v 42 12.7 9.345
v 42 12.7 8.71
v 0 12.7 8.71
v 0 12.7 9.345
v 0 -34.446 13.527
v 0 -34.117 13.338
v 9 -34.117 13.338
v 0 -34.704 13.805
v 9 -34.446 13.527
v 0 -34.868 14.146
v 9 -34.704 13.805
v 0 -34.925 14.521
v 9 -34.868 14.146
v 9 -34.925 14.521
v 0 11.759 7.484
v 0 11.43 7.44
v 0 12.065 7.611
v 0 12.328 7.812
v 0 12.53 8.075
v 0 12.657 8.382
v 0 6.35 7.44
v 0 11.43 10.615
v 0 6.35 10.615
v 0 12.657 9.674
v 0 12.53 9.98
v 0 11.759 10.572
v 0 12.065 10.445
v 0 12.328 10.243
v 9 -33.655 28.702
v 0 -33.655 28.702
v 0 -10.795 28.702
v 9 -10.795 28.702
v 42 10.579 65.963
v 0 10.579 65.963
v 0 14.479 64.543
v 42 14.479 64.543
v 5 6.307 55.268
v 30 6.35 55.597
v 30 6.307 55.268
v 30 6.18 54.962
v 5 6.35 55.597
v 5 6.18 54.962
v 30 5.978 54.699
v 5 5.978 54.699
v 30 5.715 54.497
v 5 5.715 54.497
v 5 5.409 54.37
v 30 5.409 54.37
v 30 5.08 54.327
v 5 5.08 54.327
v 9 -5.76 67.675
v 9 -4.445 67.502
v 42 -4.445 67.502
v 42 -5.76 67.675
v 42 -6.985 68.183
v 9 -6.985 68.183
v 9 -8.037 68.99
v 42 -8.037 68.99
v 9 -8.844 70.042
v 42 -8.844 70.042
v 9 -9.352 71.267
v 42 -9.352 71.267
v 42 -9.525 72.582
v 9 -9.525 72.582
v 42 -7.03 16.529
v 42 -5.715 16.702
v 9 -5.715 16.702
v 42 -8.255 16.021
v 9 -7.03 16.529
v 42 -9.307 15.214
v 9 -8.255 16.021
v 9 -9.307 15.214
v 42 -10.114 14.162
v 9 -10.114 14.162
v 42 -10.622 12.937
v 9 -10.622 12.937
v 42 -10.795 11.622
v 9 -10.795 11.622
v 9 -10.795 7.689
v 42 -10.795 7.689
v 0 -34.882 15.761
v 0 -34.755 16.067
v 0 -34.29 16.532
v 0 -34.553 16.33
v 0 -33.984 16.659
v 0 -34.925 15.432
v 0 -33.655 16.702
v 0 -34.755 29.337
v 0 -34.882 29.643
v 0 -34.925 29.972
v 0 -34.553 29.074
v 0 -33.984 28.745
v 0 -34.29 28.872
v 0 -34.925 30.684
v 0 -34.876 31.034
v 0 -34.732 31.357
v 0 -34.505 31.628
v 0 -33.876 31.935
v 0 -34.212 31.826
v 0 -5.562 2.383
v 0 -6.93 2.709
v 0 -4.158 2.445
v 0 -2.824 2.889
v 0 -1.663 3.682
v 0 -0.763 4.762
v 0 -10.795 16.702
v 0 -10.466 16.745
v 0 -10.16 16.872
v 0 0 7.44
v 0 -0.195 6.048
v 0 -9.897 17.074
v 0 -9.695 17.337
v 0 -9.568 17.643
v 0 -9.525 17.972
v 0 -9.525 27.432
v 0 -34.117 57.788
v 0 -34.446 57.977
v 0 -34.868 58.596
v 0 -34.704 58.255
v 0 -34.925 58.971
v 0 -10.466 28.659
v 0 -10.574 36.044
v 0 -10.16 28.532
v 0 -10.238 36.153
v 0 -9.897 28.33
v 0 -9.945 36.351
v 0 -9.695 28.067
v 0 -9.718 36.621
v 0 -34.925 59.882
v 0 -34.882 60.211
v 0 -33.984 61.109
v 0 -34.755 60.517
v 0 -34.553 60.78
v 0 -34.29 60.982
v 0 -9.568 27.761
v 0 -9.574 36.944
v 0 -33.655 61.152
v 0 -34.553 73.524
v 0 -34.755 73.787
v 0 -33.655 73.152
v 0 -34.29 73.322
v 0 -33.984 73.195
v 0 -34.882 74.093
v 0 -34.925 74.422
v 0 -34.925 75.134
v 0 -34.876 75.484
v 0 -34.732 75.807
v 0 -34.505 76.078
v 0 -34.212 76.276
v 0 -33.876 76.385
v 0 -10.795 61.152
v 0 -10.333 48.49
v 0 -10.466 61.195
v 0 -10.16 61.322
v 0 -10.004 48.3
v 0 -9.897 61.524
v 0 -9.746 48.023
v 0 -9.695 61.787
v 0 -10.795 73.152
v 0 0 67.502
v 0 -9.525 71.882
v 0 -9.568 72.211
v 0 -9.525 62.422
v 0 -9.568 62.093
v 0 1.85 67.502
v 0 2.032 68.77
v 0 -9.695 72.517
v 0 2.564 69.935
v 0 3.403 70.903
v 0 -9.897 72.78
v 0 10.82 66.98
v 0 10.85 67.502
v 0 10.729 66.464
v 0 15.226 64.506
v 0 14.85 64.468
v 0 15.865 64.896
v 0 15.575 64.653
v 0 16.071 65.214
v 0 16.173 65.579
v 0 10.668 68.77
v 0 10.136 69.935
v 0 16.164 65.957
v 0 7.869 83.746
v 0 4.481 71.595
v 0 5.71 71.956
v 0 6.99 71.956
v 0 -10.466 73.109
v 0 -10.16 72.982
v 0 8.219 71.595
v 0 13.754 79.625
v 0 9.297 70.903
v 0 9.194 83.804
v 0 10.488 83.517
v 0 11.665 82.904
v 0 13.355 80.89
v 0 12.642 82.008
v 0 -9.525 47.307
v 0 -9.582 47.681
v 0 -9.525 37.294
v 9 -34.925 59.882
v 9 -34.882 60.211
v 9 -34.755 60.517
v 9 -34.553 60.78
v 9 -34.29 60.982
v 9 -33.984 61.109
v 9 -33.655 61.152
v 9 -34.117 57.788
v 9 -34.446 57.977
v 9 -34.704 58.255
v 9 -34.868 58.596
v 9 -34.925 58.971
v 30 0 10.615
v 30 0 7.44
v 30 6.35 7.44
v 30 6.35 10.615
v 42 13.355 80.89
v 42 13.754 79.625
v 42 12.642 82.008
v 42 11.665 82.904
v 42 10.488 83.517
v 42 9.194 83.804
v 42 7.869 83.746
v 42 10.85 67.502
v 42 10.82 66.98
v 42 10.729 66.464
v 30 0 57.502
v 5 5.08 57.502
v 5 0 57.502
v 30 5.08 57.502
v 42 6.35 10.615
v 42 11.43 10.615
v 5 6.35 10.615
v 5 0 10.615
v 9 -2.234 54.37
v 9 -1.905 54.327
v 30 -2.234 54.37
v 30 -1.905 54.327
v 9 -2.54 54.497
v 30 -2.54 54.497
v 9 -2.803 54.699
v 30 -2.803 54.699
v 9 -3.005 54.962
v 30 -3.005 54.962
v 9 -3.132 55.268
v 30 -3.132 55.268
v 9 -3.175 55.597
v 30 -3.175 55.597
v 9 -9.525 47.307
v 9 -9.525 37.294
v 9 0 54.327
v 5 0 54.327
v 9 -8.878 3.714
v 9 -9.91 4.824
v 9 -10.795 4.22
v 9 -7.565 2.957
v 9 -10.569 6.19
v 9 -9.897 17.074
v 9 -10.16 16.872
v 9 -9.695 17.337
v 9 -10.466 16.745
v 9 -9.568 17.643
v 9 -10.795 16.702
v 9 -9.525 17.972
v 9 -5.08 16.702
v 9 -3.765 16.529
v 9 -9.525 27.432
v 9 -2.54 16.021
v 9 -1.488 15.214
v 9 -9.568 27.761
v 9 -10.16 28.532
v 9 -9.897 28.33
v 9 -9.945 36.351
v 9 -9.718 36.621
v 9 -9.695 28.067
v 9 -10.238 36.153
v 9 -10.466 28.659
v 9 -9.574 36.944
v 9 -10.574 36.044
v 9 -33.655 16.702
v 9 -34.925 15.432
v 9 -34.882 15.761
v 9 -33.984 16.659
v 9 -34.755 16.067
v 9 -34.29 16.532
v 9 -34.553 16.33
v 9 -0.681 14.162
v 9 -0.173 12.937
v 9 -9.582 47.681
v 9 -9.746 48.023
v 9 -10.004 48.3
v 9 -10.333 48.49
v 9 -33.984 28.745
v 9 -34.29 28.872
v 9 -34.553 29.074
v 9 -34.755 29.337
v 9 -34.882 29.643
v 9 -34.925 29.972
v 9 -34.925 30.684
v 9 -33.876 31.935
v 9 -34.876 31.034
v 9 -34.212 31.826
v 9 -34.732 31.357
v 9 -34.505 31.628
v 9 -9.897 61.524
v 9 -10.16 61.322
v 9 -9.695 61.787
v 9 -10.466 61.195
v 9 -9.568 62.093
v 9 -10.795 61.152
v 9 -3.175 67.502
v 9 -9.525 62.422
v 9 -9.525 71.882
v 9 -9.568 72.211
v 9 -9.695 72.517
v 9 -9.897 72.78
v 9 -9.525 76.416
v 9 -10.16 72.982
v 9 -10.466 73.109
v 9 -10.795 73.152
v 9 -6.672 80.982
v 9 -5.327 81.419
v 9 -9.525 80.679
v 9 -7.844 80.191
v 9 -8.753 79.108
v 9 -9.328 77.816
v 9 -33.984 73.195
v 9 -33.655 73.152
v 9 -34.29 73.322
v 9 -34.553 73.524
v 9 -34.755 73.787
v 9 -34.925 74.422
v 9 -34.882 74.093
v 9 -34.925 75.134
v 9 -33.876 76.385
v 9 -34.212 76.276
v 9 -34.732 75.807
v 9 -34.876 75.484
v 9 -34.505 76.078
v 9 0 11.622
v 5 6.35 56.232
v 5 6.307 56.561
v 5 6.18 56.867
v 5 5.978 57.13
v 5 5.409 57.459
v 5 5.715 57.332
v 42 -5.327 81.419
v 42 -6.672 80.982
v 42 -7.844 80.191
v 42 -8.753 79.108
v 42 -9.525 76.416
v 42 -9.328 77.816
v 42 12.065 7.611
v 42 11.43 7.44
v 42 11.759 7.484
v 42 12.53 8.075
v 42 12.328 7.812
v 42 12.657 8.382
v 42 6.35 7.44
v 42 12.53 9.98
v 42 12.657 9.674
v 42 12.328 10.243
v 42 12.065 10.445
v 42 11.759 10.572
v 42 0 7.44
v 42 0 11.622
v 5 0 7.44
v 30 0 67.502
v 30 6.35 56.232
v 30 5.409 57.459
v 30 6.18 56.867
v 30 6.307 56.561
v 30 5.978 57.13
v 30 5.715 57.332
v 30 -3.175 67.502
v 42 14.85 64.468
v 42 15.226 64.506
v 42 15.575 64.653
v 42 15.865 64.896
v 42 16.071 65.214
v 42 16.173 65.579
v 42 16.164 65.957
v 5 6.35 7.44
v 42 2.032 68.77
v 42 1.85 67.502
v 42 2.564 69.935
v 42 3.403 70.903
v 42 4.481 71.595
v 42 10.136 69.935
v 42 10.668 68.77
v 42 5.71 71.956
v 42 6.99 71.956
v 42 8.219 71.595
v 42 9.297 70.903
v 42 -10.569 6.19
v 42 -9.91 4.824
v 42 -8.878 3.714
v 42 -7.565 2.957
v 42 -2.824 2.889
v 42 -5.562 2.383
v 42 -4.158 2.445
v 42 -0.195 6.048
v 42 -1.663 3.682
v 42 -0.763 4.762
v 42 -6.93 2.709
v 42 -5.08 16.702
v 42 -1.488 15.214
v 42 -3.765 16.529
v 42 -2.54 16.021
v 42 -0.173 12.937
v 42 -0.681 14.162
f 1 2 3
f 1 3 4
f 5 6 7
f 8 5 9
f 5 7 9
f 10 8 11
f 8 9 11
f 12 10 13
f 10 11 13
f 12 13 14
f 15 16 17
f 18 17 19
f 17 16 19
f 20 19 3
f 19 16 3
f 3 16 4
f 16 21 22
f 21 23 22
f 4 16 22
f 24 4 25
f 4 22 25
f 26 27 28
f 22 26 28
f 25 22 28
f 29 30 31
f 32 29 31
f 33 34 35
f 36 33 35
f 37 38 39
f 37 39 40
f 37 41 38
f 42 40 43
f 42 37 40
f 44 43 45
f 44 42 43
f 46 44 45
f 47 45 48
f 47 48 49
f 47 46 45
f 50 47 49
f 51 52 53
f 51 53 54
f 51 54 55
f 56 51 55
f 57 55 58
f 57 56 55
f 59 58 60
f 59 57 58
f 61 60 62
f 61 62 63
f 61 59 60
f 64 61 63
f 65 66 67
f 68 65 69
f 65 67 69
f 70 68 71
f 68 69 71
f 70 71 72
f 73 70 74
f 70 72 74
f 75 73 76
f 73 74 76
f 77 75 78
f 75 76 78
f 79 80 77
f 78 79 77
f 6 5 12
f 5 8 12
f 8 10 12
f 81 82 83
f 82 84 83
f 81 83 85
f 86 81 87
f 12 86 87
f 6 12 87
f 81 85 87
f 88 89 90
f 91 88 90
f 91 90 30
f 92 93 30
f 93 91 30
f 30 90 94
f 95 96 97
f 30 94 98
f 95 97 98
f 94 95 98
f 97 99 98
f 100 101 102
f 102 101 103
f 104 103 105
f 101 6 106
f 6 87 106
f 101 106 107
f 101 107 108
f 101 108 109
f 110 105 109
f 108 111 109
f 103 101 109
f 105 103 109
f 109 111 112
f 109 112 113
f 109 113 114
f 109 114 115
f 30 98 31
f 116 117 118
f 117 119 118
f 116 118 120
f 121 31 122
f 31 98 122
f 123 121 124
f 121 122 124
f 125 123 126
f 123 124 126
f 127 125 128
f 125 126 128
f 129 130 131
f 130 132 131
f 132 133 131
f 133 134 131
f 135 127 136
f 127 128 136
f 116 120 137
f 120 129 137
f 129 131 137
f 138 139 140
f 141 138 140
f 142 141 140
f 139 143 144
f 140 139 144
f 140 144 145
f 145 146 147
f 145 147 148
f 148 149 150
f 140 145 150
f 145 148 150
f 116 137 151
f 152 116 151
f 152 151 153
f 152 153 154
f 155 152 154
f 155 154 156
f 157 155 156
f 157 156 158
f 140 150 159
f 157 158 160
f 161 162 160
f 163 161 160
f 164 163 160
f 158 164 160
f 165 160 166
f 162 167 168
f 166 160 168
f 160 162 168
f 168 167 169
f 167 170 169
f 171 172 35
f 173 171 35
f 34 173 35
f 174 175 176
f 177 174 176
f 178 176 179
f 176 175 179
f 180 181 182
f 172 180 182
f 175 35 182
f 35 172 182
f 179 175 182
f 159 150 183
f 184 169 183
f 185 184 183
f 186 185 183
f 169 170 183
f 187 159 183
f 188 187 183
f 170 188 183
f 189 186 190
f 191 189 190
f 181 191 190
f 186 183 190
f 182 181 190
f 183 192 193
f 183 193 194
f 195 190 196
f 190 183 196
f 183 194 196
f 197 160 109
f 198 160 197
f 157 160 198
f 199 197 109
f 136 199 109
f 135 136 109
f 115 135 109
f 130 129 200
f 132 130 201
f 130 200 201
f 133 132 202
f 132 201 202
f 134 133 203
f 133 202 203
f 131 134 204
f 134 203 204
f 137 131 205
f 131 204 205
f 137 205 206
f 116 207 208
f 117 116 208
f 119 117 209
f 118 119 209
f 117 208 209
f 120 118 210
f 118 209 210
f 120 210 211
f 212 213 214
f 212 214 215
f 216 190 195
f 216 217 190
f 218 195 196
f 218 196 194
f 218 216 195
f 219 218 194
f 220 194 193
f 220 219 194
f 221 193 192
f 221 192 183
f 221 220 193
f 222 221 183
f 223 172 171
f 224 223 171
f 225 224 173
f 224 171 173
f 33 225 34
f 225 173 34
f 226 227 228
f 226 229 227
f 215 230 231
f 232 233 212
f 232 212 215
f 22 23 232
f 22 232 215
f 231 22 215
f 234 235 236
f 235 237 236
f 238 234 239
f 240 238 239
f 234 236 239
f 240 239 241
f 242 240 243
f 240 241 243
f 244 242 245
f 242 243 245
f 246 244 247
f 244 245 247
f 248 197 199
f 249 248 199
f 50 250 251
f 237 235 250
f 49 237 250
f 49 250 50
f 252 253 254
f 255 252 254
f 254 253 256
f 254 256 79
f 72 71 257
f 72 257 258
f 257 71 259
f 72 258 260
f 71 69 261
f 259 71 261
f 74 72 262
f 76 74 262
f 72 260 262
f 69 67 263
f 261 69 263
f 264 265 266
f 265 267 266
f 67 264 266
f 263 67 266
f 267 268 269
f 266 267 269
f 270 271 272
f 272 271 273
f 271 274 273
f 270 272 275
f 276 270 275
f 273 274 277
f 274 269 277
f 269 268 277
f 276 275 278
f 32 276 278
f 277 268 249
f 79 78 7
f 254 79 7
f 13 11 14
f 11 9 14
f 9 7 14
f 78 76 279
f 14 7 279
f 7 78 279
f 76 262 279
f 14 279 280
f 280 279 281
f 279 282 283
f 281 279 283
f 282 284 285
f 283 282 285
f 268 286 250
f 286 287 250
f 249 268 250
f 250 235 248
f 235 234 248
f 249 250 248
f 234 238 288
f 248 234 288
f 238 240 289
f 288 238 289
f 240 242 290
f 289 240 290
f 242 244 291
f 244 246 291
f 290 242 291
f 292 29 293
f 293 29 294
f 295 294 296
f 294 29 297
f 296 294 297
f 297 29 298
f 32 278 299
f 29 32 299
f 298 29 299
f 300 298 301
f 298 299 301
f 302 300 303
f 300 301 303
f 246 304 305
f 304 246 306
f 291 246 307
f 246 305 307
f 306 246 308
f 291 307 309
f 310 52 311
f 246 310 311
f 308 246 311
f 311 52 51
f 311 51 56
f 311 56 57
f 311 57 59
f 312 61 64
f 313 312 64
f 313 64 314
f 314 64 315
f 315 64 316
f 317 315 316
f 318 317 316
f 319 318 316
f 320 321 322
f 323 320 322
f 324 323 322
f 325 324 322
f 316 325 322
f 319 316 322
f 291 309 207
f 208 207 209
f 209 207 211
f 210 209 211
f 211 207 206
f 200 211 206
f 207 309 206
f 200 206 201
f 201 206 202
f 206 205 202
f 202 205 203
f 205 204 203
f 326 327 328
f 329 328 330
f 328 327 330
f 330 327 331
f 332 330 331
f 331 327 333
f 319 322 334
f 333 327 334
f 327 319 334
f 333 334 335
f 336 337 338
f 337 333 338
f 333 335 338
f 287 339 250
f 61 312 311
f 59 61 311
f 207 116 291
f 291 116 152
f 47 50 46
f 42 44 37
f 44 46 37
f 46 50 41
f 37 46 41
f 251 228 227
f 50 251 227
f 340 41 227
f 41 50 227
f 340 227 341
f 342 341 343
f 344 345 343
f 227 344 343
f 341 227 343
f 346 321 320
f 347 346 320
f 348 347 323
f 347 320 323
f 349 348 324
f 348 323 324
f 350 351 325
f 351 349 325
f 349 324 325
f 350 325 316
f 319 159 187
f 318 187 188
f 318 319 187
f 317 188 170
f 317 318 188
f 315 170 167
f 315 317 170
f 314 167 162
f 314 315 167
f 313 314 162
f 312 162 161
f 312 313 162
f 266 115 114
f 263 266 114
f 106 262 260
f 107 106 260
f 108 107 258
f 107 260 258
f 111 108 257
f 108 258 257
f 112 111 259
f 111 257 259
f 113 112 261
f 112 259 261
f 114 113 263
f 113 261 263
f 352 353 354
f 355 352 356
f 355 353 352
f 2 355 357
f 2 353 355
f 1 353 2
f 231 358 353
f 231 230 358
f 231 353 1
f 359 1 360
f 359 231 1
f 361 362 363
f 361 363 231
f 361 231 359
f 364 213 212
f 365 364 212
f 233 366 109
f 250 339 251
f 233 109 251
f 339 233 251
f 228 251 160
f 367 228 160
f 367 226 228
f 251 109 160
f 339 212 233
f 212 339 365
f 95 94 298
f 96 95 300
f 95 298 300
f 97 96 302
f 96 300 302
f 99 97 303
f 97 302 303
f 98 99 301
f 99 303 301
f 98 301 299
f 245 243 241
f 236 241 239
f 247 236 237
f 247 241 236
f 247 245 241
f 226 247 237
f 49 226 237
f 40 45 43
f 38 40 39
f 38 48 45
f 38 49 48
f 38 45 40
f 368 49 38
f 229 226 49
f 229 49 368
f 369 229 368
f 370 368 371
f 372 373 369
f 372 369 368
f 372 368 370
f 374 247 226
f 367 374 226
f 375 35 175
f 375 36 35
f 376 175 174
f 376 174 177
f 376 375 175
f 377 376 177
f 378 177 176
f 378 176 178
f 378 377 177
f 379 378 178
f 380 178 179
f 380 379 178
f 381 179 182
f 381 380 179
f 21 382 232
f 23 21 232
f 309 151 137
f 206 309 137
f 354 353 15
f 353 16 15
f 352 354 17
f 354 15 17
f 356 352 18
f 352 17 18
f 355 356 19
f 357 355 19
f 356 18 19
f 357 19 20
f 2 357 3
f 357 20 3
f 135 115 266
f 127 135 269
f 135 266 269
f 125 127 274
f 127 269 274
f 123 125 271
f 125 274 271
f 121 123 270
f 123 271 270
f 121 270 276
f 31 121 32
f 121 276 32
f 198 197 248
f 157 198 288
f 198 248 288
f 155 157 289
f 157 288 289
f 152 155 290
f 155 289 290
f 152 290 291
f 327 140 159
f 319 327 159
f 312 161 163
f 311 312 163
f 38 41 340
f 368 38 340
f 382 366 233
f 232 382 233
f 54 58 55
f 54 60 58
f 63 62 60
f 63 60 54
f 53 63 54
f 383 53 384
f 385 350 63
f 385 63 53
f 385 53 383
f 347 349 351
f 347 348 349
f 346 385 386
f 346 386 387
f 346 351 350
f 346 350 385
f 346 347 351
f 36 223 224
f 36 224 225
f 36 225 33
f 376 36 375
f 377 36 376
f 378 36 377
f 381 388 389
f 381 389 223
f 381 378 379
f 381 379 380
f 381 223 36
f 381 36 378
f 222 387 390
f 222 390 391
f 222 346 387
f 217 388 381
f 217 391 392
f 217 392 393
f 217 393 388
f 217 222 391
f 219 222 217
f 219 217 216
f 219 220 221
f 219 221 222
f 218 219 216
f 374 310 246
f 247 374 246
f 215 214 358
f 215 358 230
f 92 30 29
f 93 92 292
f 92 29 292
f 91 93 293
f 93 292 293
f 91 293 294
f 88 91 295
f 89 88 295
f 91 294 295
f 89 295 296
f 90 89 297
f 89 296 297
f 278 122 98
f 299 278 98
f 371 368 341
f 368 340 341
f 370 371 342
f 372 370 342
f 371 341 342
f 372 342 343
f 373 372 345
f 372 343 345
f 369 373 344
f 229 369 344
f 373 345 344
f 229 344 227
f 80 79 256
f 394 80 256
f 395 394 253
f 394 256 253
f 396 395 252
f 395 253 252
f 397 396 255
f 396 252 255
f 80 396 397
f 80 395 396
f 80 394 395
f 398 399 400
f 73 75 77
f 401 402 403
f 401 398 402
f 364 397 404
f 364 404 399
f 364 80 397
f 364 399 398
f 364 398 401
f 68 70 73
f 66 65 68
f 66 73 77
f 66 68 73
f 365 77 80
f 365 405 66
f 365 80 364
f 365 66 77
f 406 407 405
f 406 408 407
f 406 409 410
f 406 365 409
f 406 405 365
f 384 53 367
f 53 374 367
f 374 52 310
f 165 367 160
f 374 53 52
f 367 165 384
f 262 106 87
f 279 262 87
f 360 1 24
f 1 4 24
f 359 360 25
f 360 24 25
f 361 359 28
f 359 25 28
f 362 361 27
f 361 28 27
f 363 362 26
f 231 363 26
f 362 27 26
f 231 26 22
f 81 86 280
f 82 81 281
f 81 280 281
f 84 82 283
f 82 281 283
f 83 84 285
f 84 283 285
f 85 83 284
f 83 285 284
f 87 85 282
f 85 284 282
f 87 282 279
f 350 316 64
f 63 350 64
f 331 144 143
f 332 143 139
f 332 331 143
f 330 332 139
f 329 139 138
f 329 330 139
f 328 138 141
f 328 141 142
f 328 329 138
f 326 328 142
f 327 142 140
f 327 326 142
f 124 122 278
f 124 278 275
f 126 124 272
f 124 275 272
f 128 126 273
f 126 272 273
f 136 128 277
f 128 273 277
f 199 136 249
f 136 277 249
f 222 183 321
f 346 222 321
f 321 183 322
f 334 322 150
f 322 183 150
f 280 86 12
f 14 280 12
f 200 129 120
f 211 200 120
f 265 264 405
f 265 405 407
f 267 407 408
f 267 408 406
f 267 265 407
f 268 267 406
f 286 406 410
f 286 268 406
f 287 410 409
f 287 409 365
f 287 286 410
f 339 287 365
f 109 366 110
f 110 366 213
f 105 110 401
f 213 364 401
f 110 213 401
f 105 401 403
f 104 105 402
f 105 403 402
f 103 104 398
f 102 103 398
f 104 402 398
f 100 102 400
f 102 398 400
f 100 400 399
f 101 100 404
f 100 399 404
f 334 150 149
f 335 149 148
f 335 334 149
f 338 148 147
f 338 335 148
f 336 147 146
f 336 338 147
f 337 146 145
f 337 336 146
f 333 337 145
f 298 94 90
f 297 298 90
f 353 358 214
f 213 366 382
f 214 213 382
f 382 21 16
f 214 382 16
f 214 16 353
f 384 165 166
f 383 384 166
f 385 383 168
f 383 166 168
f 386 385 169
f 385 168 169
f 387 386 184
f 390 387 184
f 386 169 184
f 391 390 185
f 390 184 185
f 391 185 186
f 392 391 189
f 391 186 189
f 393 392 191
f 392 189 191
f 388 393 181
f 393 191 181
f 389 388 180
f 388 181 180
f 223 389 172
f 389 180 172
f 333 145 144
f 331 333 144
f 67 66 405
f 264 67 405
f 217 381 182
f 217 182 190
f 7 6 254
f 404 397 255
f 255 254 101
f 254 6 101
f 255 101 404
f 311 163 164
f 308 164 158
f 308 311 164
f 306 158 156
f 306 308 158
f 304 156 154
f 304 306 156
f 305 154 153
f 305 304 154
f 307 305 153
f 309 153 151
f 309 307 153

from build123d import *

# Parameters (mm, degrees)
F1_DEPTH       = 42
F2_R           = 5.08
F3_R           = 1.27
F4_W           = 25
F4_H           = 3.175
F5_DEPTH       = 12.7
F7_DEPTH       = 33
F8_T1_DEPTH    = 45.7
F8_T3_DEPTH    = 43.656565316
F8_T5_DEPTH    = 41.6709689227
F9_W           = 6.35
F9_H           = 3.175
F10_DEPTH      = 12
F10_DEPTH_BACK = 30
F12_DEPTH      = 21
F12_DEPTH_BACK = 4
F13_R          = 1.27


# Not quite as in the source:
# - a fillet or chamfer that OpenCascade refuses, or shapes differently, is made with other operations: its cross-section is extruded or revolved along the edge and cut away or added


with BuildPart() as f1:
    # F0 (on Right) → F1 (new body)
    with BuildSketch(Plane.YZ):
        with BuildLine():
            Line((0, 0), (0, 67.502))
            Line((0, 67.502), (1.85, 67.502))
            ThreePointArc((1.85, 67.502), (6.35, 72.002), (10.85, 67.502))
            ThreePointArc((10.85, 67.502), (10.7816348886, 66.7205832005), (10.5786167935, 65.962909355))
            Line((10.5786167935, 65.962909355), (16.5456649355, 63.7910814449))
            Line((16.5456649355, 63.7910814449), (12.8715844298, 84.6278274207))
            Line((12.8715844298, 84.6278274207), (-34.925, 76.2))
            Line((-34.925, 76.2), (-34.925, 73.152))
            Line((-34.925, 73.152), (-9.525, 73.152))
            Line((-9.525, 73.152), (-9.525, 61.152))
            Line((-9.525, 61.152), (-34.925, 61.152))
            Line((-34.925, 61.152), (-34.925, 58.104))
            Line((-34.925, 58.104), (-9.525, 48.1738181818))
            Line((-9.525, 48.1738181818), (-9.525, 36.22870531))
            Line((-9.525, 36.22870531), (-34.925, 31.75))
            Line((-34.925, 31.75), (-34.925, 28.702))
            Line((-34.925, 28.702), (-9.525, 28.702))
            Line((-9.525, 28.702), (-9.525, 16.702))
            Line((-9.525, 16.702), (-34.925, 16.702))
            Line((-34.925, 16.702), (-34.925, 13.654))
            Line((-34.925, 13.654), (0, 0))
        make_face()
    extrude(amount=F1_DEPTH)

    # F2
    f2_edges = [f1.edges().sort_by_distance(p)[0] for p in [
        (21, 12.871584, 84.627827),
        (21, 0, 0),
    ]]
    fillet(f2_edges, radius=F2_R)

    # F3
    f3_edges = [f1.edges().sort_by_distance(p)[0] for p in [
        (21, 16.545665, 63.791081),
        (21, -9.525, 28.702),
        (21, -9.525, 48.173818),
        (21, -9.525, 73.152),
        (21, -9.525, 61.152),
        (21, -9.525, 16.702),
        (21, -34.925, 16.702),
        (21, -34.925, 13.654),
        (21, -34.925, 28.702),
        (21, -34.925, 61.152),
        (21, -34.925, 58.104),
        (21, -34.925, 31.75),
        (21, -34.925, 73.152),
        (21, -34.925, 76.2),
        (21, -9.525, 36.228705),
    ]]
    fillet(f3_edges, radius=F3_R)

    # F4 (on face) → F5 (join)
    with BuildSketch(Plane(origin=(0, 0, 0), x_dir=(-1, 0, 0), z_dir=(0, 1, 0))):
        with Locations((-17.5, 9.0279602963)):
            Rectangle(F4_W, F4_H)
    extrude(amount=F5_DEPTH)

    # F6 (on face) → F7 (cut)
    with BuildSketch(Plane.YZ.offset(42)):
        Polygon((0, 16.702), (0, 67.502), (-9.525, 67.502), (-9.525, 80.67870531), (-34.925, 80.67870531), (-34.925, 4.2203272727), (-10.795, 4.2203272727), (-10.795, 16.702), align=None)
    extrude(amount=-F7_DEPTH, mode=Mode.SUBTRACT)

    # F8: fillet of radius 5.08 on 5 edges, made by hand

    # F8_s2 → F8_t1 (cut)
    with BuildSketch(Plane.YZ.offset(9)):
        with BuildLine():
            ThreePointArc((-4.445, 67.502), (-8.0371024484, 68.9898975516), (-9.525, 72.582))
            Line((-9.525, 72.582), (-9.525, 67.502))
            Line((-9.525, 67.502), (-4.445, 67.502))
        make_face()
        with BuildLine():
            ThreePointArc((-5.715, 16.702), (-9.3071024484, 15.2141024484), (-10.795, 11.622))
            Line((-10.795, 11.622), (-10.795, 16.702))
            Line((-10.795, 16.702), (-5.715, 16.702))
        make_face()
        with BuildLine():
            ThreePointArc((-5.08, 16.702), (-1.4878975516, 15.2141024484), (0, 11.622))
            Line((0, 11.622), (0, 16.702))
            Line((0, 16.702), (-5.08, 16.702))
        make_face()
    extrude(amount=F8_T1_DEPTH, mode=Mode.SUBTRACT)

    # F8_s4 → F8_t3 (cut)
    with BuildSketch(Plane.YZ.offset(9)):
        with BuildLine():
            ThreePointArc((-5.3271327425, 81.4189025689), (-8.336505771, 79.6814402408), (-9.525, 76.4160791836))
            Line((-9.525, 76.4160791836), (-9.525, 80.67870531))
            Line((-9.525, 80.67870531), (-5.3271327425, 81.4189025689))
        make_face()
    extrude(amount=F8_T3_DEPTH, mode=Mode.SUBTRACT)

    # F8_s6 → F8_t5 (cut)
    with BuildSketch(Plane.YZ.offset(9)):
        with BuildLine():
            ThreePointArc((-10.795, 7.6887148418), (-9.9104077053, 4.8242857213), (-7.5647030762, 2.9574361003))
            Line((-7.5647030762, 2.9574361003), (-10.795, 4.2203272727))
            Line((-10.795, 4.2203272727), (-10.795, 7.6887148418))
        make_face()
    extrude(amount=F8_T5_DEPTH, mode=Mode.SUBTRACT)

    # F9 (on face) → F10 (join, two sides)
    with BuildSketch(Plane.YZ.offset(30)) as f10_sk:
        with Locations((9.525, 9.0279602963)):
            Rectangle(F9_W, F9_H)
    extrude(amount=F10_DEPTH)
    extrude(f10_sk.sketch, amount=-F10_DEPTH_BACK)

    # F11 (on face) → F12 (join, two sides)
    with BuildSketch(Plane.YZ.offset(9)) as f12_sk:
        Polygon((0, 57.502), (0, 67.502), (-3.175, 67.502), (-3.175, 54.327), (6.35, 54.327), (6.35, 57.502), align=None)
    extrude(amount=F12_DEPTH)
    extrude(f12_sk.sketch, amount=-F12_DEPTH_BACK)

    # F13
    f13_edges = [f1.edges().sort_by_distance(p)[0] for p in [
        (21, 12.7, 10.61546),
        (21, 12.7, 7.44046),
        (17.5, 6.35, 57.502),
        (17.5, 6.35, 54.327),
        (19.5, -3.175, 54.327),
    ]]
    fillet(f13_edges, radius=F13_R)


solid = f1.part
